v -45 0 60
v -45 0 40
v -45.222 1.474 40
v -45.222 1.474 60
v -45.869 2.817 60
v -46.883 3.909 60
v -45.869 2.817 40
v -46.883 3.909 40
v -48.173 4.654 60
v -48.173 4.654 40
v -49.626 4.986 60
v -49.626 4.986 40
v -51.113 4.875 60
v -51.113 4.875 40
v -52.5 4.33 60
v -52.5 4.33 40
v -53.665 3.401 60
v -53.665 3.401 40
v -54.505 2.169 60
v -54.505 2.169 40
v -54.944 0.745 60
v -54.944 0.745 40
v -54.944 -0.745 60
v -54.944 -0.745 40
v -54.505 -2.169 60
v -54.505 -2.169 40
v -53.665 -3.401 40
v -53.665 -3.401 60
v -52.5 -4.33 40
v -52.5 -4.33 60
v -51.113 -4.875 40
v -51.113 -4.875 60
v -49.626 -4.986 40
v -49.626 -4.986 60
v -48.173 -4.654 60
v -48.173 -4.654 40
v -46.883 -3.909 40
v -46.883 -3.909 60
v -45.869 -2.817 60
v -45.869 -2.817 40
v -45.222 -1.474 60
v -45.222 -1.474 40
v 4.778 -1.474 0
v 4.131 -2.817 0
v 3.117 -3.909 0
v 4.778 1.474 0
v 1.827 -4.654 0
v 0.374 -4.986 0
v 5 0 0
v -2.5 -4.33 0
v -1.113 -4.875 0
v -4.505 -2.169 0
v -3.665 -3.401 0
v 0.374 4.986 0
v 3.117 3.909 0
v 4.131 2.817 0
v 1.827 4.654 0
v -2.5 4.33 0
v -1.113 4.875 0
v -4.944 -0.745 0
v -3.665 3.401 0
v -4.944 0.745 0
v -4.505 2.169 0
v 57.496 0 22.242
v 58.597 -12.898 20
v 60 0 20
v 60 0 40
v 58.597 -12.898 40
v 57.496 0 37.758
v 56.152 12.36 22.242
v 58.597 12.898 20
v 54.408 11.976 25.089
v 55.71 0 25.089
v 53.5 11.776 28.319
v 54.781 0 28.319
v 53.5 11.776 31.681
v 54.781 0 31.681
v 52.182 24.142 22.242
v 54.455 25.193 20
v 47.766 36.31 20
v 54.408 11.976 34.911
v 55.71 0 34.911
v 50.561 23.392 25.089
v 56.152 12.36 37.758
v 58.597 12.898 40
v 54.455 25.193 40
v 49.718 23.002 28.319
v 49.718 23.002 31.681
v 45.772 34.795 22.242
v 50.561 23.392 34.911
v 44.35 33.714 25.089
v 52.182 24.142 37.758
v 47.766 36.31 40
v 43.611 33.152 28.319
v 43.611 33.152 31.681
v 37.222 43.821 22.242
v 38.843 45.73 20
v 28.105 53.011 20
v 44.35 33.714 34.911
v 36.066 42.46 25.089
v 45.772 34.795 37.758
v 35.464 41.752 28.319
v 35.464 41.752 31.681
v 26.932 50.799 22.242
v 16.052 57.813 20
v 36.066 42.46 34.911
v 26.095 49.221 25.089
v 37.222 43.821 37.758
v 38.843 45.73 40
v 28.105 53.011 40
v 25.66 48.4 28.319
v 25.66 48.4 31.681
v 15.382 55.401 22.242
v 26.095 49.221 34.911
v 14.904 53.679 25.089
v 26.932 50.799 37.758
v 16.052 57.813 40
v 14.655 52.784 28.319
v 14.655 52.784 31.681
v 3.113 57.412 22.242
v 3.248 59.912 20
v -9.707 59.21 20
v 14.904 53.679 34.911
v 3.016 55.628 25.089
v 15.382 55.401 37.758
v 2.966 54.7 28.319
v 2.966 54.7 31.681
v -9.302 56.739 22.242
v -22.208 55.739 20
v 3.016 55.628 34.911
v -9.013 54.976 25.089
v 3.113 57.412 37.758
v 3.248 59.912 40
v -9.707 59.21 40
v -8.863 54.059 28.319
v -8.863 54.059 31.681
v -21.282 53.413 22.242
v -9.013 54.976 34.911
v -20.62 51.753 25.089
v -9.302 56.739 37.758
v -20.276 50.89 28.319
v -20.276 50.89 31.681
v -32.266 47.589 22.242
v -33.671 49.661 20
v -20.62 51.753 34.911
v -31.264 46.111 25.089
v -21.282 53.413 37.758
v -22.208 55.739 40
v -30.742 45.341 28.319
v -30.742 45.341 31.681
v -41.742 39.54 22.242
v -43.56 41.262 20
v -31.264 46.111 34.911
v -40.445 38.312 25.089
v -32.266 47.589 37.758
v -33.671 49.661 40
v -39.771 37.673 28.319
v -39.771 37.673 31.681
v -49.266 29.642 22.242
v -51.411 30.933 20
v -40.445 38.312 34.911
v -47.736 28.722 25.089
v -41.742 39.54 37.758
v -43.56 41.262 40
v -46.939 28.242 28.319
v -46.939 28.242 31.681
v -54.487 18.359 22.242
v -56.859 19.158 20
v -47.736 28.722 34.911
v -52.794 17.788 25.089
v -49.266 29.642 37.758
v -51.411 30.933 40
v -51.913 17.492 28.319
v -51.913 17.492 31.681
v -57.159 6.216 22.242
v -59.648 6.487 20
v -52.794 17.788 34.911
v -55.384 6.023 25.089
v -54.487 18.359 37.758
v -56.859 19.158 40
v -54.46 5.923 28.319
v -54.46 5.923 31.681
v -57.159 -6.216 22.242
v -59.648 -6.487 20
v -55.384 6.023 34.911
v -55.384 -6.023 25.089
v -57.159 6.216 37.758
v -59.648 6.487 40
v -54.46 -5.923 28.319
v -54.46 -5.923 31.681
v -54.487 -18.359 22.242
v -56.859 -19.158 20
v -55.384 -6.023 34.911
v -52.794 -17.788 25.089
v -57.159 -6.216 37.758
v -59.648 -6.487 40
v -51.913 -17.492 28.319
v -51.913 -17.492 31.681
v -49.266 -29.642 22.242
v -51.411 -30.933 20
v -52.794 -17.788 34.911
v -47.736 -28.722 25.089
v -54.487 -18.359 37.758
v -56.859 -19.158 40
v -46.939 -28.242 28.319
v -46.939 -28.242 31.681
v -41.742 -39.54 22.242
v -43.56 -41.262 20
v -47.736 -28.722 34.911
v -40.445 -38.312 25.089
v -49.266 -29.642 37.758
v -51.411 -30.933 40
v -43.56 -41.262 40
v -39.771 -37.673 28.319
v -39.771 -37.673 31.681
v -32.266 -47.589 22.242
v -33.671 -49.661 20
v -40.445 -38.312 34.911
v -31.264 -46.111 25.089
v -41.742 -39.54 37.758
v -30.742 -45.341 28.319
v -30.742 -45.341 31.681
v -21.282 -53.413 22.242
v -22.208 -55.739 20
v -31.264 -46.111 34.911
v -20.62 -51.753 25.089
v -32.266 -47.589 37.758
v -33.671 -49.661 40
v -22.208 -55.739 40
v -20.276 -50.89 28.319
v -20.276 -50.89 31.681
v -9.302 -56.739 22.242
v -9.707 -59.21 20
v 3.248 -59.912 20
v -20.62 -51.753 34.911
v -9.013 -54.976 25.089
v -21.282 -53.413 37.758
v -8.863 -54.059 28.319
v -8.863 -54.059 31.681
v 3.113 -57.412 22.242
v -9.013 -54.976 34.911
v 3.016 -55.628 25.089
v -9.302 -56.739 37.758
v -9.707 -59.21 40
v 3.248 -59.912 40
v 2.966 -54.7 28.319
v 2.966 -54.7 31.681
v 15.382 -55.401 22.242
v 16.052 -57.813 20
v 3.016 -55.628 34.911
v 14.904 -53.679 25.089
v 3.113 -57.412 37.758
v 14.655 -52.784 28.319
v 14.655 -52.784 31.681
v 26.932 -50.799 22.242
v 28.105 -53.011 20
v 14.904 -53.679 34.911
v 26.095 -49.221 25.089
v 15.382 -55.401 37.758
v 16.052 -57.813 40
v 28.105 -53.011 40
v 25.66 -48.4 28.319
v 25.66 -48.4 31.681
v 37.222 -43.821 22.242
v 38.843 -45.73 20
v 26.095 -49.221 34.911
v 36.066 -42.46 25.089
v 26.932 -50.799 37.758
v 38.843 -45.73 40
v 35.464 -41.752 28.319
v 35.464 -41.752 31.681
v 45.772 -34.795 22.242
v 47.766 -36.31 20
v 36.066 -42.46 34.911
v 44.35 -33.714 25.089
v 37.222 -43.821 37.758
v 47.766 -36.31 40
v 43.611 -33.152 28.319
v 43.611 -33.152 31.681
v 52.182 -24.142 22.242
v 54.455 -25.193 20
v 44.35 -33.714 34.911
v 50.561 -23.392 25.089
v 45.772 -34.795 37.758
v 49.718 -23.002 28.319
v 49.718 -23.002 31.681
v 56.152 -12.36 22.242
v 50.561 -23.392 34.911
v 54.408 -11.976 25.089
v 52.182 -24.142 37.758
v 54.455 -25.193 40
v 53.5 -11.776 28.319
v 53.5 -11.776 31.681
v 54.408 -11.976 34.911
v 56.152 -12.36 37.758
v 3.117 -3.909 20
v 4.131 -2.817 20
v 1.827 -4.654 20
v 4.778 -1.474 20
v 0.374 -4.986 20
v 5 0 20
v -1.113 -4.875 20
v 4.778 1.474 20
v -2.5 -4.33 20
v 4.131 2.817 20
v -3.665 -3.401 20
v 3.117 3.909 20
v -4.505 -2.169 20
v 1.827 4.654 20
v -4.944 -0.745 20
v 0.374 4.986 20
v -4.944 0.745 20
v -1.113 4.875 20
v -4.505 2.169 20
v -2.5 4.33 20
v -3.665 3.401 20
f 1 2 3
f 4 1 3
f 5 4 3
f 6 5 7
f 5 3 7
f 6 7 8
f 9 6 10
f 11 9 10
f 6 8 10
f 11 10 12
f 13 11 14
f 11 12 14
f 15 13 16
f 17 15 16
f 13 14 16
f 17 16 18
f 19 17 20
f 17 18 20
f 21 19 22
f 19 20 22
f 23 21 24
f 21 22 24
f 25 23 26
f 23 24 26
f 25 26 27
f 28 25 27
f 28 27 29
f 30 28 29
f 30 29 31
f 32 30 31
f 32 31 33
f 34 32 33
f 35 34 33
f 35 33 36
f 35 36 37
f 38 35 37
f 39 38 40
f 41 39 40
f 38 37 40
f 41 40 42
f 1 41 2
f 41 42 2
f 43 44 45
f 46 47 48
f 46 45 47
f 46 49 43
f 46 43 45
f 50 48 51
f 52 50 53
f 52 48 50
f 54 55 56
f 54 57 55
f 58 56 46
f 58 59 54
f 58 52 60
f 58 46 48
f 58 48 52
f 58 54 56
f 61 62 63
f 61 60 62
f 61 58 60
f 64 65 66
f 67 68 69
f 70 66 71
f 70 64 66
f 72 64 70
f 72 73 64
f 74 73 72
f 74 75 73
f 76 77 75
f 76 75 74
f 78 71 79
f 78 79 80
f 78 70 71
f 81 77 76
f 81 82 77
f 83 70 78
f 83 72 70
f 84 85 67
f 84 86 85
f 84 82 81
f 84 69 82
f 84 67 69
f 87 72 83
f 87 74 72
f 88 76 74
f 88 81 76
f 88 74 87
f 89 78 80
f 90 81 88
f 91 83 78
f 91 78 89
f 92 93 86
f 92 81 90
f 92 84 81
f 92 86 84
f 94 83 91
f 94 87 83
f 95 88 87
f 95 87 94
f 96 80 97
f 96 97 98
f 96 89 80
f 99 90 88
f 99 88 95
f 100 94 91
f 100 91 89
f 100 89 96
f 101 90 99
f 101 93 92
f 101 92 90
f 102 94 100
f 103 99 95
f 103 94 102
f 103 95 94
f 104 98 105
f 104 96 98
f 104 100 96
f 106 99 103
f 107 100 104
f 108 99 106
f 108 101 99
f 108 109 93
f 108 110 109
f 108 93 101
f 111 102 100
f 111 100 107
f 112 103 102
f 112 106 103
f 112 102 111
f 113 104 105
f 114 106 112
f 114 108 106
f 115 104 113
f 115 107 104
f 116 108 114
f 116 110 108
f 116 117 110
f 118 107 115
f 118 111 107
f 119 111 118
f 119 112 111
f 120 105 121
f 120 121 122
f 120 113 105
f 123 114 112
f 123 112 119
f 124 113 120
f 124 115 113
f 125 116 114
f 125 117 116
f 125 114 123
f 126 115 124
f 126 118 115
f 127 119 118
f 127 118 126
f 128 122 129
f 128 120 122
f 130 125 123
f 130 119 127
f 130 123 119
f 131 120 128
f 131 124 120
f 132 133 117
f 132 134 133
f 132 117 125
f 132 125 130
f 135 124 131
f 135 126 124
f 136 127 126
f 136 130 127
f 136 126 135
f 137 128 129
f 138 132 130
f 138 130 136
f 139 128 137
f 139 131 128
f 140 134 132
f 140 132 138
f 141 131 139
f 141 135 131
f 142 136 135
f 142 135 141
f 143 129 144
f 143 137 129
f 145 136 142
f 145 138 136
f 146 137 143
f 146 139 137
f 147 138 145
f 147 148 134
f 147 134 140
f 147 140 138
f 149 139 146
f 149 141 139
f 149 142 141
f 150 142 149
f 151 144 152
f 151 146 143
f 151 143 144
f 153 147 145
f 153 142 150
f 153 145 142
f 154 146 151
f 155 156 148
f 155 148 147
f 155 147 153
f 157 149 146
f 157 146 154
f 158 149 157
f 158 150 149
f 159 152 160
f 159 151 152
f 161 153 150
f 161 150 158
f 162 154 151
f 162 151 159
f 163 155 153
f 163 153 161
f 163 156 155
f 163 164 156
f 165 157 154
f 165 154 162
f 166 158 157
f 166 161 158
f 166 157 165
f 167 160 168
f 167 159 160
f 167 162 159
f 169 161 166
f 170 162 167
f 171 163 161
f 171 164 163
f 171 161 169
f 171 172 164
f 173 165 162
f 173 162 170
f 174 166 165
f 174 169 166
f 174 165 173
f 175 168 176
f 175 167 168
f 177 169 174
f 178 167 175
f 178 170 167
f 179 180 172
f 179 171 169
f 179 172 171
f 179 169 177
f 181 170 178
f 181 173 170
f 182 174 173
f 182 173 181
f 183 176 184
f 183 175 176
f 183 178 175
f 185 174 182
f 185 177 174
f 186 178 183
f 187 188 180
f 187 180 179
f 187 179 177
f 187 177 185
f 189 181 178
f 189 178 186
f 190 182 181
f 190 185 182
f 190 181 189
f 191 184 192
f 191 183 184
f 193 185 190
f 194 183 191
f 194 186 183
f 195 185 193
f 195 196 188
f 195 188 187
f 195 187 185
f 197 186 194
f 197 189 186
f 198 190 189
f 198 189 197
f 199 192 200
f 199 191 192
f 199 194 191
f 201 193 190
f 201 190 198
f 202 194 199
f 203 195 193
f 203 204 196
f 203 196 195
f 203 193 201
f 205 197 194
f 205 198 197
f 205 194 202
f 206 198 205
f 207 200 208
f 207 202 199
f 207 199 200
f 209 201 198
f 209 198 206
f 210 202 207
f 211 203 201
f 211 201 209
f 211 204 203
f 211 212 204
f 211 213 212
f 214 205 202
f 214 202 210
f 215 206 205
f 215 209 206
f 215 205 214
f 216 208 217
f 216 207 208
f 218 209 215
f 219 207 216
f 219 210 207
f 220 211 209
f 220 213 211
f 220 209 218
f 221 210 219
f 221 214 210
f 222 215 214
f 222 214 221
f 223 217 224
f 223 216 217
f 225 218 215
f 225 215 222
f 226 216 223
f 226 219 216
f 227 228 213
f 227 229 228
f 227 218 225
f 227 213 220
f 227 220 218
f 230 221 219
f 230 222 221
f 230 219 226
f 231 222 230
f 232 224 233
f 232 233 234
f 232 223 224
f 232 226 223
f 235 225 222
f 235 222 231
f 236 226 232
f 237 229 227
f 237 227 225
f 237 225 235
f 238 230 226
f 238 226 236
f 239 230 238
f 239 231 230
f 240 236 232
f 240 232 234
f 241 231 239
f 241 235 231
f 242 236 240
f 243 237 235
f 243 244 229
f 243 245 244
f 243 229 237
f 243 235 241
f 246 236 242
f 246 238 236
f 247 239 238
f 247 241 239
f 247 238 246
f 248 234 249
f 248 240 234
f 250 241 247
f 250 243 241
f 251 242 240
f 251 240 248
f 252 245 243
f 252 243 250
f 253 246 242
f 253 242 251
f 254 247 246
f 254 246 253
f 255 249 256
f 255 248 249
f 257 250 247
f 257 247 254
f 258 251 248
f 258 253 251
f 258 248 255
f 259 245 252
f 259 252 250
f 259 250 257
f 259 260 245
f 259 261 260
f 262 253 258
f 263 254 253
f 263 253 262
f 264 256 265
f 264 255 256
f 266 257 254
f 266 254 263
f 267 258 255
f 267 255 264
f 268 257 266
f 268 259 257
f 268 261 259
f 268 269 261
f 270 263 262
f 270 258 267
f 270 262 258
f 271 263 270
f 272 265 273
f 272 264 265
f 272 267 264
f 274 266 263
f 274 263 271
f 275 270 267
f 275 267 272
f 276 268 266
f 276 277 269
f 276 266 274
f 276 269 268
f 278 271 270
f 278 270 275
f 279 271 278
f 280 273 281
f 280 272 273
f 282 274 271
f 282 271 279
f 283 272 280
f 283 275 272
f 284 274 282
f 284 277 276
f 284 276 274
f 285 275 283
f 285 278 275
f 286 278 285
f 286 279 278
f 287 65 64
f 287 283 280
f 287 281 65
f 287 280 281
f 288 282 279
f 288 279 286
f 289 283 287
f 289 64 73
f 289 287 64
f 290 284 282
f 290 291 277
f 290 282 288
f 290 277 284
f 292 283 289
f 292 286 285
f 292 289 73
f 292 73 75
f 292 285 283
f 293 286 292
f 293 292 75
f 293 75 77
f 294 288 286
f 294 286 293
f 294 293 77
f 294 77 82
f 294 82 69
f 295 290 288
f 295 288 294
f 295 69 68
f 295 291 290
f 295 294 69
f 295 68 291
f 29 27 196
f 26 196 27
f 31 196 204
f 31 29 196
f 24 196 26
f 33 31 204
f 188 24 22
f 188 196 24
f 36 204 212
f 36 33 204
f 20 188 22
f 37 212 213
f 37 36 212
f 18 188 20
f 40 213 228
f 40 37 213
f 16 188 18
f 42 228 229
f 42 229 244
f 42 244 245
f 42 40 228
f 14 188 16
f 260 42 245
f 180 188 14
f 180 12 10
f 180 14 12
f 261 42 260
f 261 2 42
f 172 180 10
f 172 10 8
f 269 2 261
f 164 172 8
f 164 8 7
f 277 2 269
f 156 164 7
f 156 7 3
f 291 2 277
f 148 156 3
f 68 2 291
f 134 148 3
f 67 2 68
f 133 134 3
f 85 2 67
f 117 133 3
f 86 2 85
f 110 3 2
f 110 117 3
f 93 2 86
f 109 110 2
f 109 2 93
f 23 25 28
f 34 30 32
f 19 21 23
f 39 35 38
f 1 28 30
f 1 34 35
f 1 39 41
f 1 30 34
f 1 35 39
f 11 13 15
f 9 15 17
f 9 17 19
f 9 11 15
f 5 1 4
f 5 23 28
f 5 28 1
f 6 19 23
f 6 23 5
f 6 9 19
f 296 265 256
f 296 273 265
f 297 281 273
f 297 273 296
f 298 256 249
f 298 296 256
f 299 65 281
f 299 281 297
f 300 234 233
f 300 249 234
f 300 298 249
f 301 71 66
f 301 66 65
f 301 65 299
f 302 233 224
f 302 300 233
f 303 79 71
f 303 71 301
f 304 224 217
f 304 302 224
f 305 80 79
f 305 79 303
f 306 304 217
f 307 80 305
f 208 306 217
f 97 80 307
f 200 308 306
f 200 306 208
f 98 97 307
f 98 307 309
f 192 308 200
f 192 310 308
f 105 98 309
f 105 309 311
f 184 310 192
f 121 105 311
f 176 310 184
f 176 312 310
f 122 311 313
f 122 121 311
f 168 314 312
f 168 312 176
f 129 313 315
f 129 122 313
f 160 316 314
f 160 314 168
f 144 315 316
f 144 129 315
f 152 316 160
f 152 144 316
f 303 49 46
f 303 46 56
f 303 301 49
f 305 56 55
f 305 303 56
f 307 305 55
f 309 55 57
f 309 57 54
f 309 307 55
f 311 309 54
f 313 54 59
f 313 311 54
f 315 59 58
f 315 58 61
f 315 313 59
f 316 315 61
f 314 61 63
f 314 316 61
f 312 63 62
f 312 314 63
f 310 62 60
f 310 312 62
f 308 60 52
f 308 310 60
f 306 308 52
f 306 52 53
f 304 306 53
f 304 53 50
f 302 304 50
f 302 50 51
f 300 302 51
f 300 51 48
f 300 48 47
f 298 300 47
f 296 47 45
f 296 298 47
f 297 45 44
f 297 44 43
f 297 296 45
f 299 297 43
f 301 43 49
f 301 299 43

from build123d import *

# Parameters (mm, degrees)
F2_R     = 5
F3_DEPTH = 20
F4_R     = 5
F5_DEPTH = 30


with BuildPart() as f1:
    # F0 (on Front) → F1 (revolve)
    with BuildSketch(Plane.XZ):
        with BuildLine():
            Line((0, 70), (0, 0))
            Line((0, 0), (5, 0))
            Line((5, 0), (5, 20))
            Line((5, 20), (60, 20))
            ThreePointArc((60, 20), (54.662927, 30), (60, 40))
            Line((60, 40), (5, 40))
            Line((5, 40), (5, 70))
            Line((5, 70), (0, 70))
        make_face()
    revolve(axis=Axis((0, 0, 35), (0, 0, 1)))

    # F2 (on face) → F3 (join)
    with BuildSketch(Plane.XY.offset(40)):
        with Locations((-50, 0)):
            Circle(F2_R)
    extrude(amount=F3_DEPTH)

    # F4 (on face) → F5 (cut)
    with BuildSketch(Plane.XY.offset(70)):
        Circle(F4_R)
    extrude(amount=-F5_DEPTH, mode=Mode.SUBTRACT)


solid = f1.part
